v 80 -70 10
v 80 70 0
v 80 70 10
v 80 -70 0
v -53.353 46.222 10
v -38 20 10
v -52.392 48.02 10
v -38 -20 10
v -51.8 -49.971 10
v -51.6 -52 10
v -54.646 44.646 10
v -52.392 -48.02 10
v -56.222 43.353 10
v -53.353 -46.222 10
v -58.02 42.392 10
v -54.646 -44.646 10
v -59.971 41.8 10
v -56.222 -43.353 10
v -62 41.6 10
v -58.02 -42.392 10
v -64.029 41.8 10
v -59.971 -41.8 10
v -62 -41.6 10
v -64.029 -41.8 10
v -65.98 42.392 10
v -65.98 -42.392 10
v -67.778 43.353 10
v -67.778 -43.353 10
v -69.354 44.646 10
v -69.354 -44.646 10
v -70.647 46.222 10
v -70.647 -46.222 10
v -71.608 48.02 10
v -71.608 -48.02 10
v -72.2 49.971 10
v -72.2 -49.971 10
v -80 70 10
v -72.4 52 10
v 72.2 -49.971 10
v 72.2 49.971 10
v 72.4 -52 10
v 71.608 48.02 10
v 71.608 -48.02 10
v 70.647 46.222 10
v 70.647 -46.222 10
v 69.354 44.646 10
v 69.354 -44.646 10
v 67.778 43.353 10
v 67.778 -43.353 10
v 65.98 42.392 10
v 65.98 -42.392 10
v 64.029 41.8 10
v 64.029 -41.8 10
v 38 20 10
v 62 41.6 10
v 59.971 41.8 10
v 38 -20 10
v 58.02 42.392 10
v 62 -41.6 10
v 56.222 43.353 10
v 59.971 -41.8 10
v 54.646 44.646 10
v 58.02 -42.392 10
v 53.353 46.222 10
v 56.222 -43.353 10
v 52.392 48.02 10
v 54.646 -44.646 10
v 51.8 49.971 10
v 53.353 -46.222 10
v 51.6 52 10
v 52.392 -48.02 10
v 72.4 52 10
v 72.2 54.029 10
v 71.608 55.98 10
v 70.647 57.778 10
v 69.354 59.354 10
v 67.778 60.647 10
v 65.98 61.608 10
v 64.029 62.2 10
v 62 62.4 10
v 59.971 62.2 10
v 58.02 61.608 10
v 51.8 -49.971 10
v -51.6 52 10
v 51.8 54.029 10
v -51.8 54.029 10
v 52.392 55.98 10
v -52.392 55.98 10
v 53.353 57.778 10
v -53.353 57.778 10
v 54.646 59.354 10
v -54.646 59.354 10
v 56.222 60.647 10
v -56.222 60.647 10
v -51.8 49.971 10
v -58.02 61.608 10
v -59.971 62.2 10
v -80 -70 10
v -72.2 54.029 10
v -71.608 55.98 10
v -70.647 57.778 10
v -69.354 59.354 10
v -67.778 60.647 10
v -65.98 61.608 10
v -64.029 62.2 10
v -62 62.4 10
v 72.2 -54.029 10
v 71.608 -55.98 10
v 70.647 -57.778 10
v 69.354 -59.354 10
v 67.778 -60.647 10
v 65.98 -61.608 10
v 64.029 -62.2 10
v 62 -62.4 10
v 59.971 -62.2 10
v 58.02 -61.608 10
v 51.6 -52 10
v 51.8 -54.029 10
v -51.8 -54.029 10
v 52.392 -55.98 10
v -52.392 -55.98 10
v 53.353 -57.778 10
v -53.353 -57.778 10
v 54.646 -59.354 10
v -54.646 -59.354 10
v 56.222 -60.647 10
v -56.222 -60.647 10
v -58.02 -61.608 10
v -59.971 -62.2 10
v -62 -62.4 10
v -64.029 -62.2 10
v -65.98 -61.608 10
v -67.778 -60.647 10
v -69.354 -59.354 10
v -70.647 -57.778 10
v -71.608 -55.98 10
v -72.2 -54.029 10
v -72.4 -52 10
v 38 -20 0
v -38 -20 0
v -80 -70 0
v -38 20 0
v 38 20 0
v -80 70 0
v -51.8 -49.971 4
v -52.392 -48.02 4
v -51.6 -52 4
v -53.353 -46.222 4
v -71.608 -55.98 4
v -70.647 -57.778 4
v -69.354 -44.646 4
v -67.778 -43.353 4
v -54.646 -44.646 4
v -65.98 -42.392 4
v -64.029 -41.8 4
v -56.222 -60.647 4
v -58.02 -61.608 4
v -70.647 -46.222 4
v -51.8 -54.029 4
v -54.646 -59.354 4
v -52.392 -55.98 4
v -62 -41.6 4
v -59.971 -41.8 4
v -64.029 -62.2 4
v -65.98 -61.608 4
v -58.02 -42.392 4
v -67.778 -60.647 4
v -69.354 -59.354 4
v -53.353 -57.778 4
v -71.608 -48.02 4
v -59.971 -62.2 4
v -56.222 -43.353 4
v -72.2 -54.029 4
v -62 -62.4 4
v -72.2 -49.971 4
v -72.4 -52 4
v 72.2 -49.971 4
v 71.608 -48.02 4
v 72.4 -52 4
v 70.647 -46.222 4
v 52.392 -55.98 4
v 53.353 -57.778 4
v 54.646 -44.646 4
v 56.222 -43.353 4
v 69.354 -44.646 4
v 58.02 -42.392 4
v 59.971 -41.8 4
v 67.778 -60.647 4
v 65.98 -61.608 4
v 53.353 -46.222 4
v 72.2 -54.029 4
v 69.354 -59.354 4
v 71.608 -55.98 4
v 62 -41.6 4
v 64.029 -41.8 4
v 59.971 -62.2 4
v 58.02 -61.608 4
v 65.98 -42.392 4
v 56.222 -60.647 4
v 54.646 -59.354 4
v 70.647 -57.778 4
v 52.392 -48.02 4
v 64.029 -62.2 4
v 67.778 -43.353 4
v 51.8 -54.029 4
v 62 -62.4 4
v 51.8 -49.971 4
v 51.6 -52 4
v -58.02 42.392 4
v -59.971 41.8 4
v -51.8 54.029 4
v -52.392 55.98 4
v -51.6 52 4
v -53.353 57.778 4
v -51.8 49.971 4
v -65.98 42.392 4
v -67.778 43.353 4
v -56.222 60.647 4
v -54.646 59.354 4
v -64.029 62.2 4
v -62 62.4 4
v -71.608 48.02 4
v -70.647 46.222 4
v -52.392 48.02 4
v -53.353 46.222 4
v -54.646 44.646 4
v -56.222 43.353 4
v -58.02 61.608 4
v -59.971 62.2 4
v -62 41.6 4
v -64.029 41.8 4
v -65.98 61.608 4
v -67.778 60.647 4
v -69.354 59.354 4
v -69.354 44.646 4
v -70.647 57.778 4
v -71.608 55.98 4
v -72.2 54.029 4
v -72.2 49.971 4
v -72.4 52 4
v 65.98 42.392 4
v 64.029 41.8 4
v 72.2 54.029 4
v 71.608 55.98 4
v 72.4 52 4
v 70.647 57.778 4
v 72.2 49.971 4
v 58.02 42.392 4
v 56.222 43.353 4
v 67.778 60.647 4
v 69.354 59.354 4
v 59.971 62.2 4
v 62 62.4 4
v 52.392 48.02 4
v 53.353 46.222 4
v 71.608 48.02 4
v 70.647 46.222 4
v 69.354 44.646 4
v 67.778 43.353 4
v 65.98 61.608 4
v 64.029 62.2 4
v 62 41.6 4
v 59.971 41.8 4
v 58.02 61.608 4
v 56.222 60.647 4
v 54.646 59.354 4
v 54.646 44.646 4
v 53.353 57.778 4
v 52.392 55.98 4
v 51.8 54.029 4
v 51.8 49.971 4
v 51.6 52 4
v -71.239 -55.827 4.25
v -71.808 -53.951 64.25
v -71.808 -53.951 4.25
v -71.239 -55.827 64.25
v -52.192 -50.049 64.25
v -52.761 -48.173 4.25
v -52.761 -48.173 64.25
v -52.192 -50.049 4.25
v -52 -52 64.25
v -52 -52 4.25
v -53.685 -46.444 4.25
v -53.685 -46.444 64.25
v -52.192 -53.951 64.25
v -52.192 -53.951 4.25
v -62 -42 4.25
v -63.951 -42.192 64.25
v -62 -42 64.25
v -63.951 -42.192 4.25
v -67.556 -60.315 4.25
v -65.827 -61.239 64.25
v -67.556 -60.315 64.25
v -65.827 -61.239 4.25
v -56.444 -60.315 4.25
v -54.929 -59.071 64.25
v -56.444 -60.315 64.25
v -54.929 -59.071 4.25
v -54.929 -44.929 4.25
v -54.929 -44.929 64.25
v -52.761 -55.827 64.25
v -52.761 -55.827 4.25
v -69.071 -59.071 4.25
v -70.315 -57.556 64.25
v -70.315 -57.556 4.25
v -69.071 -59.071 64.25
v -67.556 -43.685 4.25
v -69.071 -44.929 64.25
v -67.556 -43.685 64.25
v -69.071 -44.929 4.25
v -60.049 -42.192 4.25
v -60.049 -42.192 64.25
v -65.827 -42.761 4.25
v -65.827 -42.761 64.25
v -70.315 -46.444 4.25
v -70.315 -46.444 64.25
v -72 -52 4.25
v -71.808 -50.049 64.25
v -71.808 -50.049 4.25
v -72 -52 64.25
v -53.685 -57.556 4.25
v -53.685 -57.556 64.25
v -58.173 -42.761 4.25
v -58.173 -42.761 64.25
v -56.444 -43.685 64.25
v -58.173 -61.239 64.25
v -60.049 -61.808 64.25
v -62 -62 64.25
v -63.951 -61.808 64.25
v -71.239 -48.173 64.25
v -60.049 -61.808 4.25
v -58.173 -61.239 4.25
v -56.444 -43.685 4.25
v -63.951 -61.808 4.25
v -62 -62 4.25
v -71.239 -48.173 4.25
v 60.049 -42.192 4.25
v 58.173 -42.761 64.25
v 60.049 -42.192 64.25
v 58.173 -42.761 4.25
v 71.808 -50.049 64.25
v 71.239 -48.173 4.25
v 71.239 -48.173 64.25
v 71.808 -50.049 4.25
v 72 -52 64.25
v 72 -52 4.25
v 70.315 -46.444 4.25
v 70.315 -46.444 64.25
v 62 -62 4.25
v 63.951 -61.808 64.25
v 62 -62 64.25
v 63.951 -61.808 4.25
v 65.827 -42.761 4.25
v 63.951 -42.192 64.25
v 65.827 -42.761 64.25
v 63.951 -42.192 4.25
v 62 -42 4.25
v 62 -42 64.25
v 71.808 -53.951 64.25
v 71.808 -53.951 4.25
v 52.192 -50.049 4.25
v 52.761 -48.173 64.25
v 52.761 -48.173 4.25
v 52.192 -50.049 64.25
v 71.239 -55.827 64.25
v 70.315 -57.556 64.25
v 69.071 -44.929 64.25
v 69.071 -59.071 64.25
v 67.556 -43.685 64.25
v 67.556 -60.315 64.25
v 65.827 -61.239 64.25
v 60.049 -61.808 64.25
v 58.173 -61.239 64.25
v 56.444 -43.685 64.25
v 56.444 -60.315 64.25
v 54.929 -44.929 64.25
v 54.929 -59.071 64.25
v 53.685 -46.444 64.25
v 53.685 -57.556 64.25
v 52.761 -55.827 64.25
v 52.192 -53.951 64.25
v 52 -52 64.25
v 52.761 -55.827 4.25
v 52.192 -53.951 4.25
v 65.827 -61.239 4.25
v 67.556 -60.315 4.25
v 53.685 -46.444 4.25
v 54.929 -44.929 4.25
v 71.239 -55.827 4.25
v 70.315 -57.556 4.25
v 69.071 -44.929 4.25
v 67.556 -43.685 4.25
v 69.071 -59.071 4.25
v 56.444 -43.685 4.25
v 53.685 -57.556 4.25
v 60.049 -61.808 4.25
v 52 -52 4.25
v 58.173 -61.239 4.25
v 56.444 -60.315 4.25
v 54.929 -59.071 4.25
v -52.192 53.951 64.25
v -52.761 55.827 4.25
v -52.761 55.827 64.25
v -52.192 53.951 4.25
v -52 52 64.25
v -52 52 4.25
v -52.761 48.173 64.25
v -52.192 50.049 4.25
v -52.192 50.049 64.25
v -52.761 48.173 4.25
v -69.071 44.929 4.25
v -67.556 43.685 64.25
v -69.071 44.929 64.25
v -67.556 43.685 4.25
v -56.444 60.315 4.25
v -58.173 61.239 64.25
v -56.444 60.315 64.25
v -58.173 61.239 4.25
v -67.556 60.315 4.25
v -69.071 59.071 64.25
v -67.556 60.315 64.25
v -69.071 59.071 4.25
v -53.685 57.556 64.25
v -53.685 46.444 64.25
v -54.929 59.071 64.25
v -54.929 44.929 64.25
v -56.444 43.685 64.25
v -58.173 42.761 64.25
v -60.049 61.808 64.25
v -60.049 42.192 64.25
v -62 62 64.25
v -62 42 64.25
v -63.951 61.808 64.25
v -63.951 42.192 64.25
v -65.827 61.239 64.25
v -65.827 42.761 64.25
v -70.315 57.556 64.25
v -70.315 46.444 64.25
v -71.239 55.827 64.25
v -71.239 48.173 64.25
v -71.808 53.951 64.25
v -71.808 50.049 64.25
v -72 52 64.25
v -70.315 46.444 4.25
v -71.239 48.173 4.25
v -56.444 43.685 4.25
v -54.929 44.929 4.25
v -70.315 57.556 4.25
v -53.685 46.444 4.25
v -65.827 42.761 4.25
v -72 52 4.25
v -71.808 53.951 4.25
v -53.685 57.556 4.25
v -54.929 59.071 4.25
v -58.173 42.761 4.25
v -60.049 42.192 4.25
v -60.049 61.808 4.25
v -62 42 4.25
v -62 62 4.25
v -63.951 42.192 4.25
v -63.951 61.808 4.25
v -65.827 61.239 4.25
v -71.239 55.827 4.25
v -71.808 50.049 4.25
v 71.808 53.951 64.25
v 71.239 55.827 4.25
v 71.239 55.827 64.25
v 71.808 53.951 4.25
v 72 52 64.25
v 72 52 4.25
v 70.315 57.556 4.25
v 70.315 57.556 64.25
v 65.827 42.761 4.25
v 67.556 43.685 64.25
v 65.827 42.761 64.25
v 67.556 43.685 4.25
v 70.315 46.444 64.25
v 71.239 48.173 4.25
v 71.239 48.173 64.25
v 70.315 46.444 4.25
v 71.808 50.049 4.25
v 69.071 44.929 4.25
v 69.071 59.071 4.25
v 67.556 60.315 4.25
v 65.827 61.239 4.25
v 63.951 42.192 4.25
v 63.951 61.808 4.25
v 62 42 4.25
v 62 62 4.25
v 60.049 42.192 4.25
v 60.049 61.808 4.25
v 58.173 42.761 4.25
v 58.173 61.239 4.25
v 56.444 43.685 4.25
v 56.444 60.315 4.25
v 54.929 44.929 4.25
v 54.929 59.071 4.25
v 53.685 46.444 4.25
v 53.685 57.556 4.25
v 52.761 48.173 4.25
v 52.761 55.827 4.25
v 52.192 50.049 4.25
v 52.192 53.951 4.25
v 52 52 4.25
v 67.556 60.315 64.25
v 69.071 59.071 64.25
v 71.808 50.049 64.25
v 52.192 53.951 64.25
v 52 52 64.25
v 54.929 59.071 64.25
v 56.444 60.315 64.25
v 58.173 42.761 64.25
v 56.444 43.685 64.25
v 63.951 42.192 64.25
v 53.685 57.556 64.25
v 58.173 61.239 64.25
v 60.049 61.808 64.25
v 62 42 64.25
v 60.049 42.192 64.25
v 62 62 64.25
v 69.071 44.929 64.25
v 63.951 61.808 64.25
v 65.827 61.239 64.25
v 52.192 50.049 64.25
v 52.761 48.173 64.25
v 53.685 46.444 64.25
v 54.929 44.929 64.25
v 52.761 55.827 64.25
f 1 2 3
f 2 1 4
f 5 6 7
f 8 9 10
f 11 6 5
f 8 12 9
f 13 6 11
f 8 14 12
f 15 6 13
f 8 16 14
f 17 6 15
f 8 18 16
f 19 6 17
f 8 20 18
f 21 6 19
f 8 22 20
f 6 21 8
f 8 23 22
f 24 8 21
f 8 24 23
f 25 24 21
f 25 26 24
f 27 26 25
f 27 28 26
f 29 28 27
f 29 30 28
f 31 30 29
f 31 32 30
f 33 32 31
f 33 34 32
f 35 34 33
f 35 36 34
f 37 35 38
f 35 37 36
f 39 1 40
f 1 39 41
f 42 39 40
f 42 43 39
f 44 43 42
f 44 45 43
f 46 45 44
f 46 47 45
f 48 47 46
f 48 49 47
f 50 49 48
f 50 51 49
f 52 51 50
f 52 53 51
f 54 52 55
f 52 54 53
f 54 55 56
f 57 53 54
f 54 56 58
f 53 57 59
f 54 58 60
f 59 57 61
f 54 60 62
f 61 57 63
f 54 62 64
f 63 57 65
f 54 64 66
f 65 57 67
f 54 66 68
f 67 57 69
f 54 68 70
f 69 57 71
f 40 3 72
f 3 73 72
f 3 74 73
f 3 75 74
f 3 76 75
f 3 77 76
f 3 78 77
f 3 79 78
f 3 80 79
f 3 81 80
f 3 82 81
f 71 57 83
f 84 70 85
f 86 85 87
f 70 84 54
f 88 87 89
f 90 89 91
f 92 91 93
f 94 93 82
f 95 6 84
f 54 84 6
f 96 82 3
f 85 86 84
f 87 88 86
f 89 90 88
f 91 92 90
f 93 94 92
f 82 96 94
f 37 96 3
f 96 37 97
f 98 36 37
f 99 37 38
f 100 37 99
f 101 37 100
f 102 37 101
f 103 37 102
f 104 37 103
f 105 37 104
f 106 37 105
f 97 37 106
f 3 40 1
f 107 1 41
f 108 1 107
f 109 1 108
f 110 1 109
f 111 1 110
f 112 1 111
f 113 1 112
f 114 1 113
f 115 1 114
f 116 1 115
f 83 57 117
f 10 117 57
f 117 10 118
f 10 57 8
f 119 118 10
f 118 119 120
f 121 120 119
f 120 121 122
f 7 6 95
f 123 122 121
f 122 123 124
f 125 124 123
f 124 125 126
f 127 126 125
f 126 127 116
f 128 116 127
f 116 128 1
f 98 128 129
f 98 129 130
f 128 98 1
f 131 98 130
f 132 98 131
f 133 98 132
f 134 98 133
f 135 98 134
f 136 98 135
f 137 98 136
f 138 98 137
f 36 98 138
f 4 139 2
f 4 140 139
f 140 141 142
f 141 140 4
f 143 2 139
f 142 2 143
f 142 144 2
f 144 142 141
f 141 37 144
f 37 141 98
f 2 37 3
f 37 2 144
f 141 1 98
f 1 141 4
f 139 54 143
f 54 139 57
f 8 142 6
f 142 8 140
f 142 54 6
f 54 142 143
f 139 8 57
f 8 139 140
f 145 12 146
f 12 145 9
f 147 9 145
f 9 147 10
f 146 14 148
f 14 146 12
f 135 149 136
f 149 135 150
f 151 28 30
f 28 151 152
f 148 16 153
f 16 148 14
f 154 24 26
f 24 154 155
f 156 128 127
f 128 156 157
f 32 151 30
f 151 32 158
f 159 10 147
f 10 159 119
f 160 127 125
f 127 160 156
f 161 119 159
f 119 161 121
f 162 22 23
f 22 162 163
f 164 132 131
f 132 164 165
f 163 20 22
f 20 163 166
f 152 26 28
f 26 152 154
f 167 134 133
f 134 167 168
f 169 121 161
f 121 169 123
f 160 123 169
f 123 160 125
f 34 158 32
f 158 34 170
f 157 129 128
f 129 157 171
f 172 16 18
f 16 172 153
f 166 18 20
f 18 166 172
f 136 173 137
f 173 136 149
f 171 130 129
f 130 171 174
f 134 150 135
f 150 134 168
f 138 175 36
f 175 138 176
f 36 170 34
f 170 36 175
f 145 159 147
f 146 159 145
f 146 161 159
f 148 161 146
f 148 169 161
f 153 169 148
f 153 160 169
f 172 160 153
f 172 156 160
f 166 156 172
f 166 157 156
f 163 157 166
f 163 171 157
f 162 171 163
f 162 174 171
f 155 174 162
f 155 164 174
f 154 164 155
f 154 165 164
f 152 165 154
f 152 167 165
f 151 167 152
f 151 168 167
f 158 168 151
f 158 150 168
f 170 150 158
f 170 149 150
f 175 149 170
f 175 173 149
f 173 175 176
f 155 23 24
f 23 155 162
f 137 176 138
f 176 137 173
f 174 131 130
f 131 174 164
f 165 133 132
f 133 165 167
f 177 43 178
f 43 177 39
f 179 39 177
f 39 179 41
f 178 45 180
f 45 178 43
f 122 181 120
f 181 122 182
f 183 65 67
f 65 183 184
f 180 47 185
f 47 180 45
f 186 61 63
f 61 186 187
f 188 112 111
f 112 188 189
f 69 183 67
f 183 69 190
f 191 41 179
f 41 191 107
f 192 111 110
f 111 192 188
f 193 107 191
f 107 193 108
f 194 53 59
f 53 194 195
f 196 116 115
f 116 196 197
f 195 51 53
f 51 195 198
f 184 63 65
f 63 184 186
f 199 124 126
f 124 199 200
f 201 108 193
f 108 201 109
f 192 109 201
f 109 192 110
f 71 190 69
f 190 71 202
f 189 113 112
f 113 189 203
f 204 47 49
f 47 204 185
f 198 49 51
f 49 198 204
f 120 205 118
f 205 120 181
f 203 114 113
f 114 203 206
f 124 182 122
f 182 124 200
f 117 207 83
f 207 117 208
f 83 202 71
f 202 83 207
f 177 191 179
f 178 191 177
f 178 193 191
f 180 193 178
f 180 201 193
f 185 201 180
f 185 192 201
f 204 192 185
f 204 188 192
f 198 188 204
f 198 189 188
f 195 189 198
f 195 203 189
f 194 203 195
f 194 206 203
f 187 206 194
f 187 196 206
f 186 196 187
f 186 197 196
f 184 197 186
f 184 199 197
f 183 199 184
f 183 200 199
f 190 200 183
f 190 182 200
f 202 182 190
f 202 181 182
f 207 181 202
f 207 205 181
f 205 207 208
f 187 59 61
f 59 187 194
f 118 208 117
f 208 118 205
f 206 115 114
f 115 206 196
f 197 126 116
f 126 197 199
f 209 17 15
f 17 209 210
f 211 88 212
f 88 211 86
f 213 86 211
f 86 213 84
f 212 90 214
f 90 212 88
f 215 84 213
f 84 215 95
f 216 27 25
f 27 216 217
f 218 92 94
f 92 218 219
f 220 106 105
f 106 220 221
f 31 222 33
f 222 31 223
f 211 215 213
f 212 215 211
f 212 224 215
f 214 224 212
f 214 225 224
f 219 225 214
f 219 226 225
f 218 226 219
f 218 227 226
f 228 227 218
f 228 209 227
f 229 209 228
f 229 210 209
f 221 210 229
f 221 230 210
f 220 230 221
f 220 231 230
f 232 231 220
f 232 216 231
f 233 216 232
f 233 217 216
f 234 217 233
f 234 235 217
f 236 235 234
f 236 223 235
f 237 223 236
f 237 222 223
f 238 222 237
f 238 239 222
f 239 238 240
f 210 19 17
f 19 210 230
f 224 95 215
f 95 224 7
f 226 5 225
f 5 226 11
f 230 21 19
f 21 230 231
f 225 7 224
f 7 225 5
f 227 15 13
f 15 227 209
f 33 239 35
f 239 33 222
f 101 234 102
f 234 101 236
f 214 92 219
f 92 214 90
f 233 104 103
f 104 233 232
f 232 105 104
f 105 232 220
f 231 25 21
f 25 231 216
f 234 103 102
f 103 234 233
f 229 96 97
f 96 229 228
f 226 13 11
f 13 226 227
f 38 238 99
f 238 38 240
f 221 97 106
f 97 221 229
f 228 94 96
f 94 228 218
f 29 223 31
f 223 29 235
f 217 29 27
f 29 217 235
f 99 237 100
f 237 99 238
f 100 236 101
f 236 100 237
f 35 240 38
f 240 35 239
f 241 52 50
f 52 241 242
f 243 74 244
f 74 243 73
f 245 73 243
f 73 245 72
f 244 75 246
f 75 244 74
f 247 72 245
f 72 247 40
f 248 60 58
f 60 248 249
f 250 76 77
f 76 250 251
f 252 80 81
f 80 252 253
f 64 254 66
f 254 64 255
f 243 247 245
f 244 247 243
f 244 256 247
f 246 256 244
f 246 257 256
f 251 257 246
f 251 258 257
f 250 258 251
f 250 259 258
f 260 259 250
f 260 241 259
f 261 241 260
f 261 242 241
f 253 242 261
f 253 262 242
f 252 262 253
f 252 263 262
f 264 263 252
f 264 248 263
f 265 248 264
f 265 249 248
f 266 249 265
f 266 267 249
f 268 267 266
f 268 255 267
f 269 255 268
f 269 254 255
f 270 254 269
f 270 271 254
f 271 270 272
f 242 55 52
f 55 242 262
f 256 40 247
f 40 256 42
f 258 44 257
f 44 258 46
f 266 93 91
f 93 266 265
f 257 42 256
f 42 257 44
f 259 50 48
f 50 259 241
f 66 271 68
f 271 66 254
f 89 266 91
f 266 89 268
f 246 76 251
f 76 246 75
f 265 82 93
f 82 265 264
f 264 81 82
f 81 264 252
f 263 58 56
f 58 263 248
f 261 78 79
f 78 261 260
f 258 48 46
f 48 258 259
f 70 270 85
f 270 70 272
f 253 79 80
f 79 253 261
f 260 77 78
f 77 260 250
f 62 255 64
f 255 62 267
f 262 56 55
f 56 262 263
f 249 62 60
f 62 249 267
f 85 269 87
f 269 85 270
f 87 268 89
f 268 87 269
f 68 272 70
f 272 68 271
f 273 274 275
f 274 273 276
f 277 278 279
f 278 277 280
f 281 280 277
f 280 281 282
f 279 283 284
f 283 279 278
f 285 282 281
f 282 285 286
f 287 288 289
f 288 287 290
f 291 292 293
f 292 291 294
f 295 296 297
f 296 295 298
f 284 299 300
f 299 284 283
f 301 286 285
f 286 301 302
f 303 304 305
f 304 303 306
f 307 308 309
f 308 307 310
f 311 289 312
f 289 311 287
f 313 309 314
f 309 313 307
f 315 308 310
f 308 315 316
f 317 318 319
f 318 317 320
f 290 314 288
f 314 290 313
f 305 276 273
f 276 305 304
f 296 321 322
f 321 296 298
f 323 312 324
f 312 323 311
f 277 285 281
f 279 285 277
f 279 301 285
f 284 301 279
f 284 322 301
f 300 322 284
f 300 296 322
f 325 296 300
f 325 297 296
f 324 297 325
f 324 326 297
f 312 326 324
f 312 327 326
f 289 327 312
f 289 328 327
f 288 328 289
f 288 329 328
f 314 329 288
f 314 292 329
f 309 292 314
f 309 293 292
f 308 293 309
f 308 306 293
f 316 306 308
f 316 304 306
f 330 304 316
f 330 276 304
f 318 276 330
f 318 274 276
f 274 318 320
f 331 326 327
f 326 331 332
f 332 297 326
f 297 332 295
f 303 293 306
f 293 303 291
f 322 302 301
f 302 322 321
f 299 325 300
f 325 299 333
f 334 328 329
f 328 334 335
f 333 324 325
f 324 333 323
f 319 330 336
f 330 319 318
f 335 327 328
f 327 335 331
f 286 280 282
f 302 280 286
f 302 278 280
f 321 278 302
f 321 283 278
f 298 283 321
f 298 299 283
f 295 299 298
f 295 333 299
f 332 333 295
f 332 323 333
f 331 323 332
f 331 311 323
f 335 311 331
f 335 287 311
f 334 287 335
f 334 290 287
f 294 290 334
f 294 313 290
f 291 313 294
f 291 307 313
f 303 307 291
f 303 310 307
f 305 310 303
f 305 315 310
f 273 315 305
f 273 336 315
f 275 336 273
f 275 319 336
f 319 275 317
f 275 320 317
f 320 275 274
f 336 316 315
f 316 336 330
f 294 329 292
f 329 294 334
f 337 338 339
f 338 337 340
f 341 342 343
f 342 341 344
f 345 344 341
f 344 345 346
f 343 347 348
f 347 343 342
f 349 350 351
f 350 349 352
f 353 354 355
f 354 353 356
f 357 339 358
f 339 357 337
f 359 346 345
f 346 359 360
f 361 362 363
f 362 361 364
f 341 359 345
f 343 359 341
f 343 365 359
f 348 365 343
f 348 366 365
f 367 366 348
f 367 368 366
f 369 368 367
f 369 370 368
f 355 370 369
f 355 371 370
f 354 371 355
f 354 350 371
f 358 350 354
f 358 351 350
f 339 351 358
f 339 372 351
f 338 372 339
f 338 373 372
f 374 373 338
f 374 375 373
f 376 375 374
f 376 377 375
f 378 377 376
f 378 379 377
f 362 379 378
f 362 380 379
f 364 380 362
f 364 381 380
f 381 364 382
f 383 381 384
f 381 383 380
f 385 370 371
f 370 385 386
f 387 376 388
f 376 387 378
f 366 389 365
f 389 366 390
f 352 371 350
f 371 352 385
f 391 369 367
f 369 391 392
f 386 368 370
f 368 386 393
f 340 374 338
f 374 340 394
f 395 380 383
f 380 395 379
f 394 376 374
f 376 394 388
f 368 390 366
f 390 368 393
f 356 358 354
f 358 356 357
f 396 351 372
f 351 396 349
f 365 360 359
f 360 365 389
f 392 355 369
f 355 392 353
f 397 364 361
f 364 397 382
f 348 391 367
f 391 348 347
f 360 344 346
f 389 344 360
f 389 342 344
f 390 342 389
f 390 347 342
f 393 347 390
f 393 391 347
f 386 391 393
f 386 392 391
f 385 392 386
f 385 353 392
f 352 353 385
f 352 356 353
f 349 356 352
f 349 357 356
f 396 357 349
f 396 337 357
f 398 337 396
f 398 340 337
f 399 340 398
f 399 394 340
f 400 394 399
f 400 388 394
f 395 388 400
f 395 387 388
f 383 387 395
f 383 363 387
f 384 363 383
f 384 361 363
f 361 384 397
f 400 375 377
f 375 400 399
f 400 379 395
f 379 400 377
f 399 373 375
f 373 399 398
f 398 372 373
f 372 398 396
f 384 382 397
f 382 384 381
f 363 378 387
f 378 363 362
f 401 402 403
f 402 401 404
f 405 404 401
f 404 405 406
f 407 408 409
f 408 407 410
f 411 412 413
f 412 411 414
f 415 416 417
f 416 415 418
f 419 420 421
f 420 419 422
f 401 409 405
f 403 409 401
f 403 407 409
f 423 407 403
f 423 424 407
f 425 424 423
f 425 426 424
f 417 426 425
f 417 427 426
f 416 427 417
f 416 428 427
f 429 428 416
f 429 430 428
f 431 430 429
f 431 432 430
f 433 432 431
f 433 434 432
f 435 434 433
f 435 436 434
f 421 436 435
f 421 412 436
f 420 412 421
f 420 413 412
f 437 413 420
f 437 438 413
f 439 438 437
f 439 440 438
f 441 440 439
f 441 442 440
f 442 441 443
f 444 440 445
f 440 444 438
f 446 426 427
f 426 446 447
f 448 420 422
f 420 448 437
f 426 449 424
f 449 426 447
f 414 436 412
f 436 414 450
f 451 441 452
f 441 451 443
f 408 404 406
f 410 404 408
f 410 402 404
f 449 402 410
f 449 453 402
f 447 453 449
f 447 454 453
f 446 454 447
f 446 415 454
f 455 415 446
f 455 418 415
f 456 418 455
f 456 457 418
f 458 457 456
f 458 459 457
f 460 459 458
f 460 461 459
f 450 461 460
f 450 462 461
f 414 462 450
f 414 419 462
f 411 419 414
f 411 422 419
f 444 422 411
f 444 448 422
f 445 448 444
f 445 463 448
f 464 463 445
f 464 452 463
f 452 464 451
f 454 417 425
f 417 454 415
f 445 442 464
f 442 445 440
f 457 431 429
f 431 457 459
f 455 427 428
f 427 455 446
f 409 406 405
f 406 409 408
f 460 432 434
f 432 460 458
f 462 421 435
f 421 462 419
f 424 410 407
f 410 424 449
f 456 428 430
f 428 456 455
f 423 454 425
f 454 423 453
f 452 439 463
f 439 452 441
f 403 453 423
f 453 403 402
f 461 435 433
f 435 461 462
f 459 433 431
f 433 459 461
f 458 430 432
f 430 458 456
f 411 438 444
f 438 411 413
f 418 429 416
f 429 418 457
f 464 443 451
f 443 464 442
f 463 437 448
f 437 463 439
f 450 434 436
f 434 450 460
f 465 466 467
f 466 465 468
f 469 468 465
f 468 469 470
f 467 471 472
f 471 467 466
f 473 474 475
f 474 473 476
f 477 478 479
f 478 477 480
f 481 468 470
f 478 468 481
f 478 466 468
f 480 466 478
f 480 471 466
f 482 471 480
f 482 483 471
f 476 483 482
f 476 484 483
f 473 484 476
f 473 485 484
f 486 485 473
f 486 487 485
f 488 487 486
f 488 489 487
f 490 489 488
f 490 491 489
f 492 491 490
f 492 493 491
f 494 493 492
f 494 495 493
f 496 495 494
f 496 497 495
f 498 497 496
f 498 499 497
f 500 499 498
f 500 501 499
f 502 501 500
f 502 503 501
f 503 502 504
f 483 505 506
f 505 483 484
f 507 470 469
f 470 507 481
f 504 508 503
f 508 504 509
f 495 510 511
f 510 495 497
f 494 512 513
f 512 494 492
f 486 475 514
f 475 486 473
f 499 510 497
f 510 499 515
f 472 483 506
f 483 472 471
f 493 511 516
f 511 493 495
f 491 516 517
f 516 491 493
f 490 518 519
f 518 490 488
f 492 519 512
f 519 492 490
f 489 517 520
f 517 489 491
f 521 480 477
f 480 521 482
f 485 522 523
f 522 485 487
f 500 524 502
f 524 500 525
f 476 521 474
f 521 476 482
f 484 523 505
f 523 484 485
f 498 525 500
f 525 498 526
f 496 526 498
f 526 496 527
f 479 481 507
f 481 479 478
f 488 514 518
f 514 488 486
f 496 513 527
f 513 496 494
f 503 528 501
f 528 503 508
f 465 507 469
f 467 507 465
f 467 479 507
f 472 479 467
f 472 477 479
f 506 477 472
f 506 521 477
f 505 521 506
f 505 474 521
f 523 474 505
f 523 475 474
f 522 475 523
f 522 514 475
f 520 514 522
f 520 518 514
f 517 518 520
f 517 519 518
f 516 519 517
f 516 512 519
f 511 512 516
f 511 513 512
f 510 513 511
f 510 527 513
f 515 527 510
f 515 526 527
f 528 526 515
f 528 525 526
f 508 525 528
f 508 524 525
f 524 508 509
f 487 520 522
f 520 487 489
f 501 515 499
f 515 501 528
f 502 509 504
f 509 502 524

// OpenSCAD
$fn = 32;

// ------------------------------------------------------------------------
// Frame with four posts: 160 x 140 mm frame, four d20 posts
// Every part is its own module, assembly() places them once.
// ------------------------------------------------------------------------

// --- part 1 ---
module base_frame() {
  difference() {
    translate([-80, -70, 0]) cube([160, 140, 10]);
    translate([-38, -20, -1]) cube([76, 40, 12]);
    translate([-62, -52, 4]) cylinder(h = 7, d = 20.8);
    translate([62, -52, 4]) cylinder(h = 7, d = 20.8);
    translate([-62, 52, 4]) cylinder(h = 7, d = 20.8);
    translate([62, 52, 4]) cylinder(h = 7, d = 20.8);
  }
}

// --- part 2 ---
module post1() {
  cylinder(h = 60, d = 20);
}

// --- part 3 ---
module post2() {
  cylinder(h = 60, d = 20);
}

// --- part 4 ---
module post3() {
  cylinder(h = 60, d = 20);
}

// --- part 5 ---
module post4() {
  cylinder(h = 60, d = 20);
}

// --- assembly ---
module assembly() {
  translate([0, 0, 0]) rotate([0, 0, 0]) base_frame();
  translate([-62, -52, 4.25]) rotate([0, 0, 0]) post1();
  translate([62, -52, 4.25]) rotate([0, 0, 0]) post2();
  translate([-62, 52, 4.25]) rotate([0, 0, 0]) post3();
  translate([62, 52, 4.25]) rotate([0, 0, 0]) post4();
}

assembly();
